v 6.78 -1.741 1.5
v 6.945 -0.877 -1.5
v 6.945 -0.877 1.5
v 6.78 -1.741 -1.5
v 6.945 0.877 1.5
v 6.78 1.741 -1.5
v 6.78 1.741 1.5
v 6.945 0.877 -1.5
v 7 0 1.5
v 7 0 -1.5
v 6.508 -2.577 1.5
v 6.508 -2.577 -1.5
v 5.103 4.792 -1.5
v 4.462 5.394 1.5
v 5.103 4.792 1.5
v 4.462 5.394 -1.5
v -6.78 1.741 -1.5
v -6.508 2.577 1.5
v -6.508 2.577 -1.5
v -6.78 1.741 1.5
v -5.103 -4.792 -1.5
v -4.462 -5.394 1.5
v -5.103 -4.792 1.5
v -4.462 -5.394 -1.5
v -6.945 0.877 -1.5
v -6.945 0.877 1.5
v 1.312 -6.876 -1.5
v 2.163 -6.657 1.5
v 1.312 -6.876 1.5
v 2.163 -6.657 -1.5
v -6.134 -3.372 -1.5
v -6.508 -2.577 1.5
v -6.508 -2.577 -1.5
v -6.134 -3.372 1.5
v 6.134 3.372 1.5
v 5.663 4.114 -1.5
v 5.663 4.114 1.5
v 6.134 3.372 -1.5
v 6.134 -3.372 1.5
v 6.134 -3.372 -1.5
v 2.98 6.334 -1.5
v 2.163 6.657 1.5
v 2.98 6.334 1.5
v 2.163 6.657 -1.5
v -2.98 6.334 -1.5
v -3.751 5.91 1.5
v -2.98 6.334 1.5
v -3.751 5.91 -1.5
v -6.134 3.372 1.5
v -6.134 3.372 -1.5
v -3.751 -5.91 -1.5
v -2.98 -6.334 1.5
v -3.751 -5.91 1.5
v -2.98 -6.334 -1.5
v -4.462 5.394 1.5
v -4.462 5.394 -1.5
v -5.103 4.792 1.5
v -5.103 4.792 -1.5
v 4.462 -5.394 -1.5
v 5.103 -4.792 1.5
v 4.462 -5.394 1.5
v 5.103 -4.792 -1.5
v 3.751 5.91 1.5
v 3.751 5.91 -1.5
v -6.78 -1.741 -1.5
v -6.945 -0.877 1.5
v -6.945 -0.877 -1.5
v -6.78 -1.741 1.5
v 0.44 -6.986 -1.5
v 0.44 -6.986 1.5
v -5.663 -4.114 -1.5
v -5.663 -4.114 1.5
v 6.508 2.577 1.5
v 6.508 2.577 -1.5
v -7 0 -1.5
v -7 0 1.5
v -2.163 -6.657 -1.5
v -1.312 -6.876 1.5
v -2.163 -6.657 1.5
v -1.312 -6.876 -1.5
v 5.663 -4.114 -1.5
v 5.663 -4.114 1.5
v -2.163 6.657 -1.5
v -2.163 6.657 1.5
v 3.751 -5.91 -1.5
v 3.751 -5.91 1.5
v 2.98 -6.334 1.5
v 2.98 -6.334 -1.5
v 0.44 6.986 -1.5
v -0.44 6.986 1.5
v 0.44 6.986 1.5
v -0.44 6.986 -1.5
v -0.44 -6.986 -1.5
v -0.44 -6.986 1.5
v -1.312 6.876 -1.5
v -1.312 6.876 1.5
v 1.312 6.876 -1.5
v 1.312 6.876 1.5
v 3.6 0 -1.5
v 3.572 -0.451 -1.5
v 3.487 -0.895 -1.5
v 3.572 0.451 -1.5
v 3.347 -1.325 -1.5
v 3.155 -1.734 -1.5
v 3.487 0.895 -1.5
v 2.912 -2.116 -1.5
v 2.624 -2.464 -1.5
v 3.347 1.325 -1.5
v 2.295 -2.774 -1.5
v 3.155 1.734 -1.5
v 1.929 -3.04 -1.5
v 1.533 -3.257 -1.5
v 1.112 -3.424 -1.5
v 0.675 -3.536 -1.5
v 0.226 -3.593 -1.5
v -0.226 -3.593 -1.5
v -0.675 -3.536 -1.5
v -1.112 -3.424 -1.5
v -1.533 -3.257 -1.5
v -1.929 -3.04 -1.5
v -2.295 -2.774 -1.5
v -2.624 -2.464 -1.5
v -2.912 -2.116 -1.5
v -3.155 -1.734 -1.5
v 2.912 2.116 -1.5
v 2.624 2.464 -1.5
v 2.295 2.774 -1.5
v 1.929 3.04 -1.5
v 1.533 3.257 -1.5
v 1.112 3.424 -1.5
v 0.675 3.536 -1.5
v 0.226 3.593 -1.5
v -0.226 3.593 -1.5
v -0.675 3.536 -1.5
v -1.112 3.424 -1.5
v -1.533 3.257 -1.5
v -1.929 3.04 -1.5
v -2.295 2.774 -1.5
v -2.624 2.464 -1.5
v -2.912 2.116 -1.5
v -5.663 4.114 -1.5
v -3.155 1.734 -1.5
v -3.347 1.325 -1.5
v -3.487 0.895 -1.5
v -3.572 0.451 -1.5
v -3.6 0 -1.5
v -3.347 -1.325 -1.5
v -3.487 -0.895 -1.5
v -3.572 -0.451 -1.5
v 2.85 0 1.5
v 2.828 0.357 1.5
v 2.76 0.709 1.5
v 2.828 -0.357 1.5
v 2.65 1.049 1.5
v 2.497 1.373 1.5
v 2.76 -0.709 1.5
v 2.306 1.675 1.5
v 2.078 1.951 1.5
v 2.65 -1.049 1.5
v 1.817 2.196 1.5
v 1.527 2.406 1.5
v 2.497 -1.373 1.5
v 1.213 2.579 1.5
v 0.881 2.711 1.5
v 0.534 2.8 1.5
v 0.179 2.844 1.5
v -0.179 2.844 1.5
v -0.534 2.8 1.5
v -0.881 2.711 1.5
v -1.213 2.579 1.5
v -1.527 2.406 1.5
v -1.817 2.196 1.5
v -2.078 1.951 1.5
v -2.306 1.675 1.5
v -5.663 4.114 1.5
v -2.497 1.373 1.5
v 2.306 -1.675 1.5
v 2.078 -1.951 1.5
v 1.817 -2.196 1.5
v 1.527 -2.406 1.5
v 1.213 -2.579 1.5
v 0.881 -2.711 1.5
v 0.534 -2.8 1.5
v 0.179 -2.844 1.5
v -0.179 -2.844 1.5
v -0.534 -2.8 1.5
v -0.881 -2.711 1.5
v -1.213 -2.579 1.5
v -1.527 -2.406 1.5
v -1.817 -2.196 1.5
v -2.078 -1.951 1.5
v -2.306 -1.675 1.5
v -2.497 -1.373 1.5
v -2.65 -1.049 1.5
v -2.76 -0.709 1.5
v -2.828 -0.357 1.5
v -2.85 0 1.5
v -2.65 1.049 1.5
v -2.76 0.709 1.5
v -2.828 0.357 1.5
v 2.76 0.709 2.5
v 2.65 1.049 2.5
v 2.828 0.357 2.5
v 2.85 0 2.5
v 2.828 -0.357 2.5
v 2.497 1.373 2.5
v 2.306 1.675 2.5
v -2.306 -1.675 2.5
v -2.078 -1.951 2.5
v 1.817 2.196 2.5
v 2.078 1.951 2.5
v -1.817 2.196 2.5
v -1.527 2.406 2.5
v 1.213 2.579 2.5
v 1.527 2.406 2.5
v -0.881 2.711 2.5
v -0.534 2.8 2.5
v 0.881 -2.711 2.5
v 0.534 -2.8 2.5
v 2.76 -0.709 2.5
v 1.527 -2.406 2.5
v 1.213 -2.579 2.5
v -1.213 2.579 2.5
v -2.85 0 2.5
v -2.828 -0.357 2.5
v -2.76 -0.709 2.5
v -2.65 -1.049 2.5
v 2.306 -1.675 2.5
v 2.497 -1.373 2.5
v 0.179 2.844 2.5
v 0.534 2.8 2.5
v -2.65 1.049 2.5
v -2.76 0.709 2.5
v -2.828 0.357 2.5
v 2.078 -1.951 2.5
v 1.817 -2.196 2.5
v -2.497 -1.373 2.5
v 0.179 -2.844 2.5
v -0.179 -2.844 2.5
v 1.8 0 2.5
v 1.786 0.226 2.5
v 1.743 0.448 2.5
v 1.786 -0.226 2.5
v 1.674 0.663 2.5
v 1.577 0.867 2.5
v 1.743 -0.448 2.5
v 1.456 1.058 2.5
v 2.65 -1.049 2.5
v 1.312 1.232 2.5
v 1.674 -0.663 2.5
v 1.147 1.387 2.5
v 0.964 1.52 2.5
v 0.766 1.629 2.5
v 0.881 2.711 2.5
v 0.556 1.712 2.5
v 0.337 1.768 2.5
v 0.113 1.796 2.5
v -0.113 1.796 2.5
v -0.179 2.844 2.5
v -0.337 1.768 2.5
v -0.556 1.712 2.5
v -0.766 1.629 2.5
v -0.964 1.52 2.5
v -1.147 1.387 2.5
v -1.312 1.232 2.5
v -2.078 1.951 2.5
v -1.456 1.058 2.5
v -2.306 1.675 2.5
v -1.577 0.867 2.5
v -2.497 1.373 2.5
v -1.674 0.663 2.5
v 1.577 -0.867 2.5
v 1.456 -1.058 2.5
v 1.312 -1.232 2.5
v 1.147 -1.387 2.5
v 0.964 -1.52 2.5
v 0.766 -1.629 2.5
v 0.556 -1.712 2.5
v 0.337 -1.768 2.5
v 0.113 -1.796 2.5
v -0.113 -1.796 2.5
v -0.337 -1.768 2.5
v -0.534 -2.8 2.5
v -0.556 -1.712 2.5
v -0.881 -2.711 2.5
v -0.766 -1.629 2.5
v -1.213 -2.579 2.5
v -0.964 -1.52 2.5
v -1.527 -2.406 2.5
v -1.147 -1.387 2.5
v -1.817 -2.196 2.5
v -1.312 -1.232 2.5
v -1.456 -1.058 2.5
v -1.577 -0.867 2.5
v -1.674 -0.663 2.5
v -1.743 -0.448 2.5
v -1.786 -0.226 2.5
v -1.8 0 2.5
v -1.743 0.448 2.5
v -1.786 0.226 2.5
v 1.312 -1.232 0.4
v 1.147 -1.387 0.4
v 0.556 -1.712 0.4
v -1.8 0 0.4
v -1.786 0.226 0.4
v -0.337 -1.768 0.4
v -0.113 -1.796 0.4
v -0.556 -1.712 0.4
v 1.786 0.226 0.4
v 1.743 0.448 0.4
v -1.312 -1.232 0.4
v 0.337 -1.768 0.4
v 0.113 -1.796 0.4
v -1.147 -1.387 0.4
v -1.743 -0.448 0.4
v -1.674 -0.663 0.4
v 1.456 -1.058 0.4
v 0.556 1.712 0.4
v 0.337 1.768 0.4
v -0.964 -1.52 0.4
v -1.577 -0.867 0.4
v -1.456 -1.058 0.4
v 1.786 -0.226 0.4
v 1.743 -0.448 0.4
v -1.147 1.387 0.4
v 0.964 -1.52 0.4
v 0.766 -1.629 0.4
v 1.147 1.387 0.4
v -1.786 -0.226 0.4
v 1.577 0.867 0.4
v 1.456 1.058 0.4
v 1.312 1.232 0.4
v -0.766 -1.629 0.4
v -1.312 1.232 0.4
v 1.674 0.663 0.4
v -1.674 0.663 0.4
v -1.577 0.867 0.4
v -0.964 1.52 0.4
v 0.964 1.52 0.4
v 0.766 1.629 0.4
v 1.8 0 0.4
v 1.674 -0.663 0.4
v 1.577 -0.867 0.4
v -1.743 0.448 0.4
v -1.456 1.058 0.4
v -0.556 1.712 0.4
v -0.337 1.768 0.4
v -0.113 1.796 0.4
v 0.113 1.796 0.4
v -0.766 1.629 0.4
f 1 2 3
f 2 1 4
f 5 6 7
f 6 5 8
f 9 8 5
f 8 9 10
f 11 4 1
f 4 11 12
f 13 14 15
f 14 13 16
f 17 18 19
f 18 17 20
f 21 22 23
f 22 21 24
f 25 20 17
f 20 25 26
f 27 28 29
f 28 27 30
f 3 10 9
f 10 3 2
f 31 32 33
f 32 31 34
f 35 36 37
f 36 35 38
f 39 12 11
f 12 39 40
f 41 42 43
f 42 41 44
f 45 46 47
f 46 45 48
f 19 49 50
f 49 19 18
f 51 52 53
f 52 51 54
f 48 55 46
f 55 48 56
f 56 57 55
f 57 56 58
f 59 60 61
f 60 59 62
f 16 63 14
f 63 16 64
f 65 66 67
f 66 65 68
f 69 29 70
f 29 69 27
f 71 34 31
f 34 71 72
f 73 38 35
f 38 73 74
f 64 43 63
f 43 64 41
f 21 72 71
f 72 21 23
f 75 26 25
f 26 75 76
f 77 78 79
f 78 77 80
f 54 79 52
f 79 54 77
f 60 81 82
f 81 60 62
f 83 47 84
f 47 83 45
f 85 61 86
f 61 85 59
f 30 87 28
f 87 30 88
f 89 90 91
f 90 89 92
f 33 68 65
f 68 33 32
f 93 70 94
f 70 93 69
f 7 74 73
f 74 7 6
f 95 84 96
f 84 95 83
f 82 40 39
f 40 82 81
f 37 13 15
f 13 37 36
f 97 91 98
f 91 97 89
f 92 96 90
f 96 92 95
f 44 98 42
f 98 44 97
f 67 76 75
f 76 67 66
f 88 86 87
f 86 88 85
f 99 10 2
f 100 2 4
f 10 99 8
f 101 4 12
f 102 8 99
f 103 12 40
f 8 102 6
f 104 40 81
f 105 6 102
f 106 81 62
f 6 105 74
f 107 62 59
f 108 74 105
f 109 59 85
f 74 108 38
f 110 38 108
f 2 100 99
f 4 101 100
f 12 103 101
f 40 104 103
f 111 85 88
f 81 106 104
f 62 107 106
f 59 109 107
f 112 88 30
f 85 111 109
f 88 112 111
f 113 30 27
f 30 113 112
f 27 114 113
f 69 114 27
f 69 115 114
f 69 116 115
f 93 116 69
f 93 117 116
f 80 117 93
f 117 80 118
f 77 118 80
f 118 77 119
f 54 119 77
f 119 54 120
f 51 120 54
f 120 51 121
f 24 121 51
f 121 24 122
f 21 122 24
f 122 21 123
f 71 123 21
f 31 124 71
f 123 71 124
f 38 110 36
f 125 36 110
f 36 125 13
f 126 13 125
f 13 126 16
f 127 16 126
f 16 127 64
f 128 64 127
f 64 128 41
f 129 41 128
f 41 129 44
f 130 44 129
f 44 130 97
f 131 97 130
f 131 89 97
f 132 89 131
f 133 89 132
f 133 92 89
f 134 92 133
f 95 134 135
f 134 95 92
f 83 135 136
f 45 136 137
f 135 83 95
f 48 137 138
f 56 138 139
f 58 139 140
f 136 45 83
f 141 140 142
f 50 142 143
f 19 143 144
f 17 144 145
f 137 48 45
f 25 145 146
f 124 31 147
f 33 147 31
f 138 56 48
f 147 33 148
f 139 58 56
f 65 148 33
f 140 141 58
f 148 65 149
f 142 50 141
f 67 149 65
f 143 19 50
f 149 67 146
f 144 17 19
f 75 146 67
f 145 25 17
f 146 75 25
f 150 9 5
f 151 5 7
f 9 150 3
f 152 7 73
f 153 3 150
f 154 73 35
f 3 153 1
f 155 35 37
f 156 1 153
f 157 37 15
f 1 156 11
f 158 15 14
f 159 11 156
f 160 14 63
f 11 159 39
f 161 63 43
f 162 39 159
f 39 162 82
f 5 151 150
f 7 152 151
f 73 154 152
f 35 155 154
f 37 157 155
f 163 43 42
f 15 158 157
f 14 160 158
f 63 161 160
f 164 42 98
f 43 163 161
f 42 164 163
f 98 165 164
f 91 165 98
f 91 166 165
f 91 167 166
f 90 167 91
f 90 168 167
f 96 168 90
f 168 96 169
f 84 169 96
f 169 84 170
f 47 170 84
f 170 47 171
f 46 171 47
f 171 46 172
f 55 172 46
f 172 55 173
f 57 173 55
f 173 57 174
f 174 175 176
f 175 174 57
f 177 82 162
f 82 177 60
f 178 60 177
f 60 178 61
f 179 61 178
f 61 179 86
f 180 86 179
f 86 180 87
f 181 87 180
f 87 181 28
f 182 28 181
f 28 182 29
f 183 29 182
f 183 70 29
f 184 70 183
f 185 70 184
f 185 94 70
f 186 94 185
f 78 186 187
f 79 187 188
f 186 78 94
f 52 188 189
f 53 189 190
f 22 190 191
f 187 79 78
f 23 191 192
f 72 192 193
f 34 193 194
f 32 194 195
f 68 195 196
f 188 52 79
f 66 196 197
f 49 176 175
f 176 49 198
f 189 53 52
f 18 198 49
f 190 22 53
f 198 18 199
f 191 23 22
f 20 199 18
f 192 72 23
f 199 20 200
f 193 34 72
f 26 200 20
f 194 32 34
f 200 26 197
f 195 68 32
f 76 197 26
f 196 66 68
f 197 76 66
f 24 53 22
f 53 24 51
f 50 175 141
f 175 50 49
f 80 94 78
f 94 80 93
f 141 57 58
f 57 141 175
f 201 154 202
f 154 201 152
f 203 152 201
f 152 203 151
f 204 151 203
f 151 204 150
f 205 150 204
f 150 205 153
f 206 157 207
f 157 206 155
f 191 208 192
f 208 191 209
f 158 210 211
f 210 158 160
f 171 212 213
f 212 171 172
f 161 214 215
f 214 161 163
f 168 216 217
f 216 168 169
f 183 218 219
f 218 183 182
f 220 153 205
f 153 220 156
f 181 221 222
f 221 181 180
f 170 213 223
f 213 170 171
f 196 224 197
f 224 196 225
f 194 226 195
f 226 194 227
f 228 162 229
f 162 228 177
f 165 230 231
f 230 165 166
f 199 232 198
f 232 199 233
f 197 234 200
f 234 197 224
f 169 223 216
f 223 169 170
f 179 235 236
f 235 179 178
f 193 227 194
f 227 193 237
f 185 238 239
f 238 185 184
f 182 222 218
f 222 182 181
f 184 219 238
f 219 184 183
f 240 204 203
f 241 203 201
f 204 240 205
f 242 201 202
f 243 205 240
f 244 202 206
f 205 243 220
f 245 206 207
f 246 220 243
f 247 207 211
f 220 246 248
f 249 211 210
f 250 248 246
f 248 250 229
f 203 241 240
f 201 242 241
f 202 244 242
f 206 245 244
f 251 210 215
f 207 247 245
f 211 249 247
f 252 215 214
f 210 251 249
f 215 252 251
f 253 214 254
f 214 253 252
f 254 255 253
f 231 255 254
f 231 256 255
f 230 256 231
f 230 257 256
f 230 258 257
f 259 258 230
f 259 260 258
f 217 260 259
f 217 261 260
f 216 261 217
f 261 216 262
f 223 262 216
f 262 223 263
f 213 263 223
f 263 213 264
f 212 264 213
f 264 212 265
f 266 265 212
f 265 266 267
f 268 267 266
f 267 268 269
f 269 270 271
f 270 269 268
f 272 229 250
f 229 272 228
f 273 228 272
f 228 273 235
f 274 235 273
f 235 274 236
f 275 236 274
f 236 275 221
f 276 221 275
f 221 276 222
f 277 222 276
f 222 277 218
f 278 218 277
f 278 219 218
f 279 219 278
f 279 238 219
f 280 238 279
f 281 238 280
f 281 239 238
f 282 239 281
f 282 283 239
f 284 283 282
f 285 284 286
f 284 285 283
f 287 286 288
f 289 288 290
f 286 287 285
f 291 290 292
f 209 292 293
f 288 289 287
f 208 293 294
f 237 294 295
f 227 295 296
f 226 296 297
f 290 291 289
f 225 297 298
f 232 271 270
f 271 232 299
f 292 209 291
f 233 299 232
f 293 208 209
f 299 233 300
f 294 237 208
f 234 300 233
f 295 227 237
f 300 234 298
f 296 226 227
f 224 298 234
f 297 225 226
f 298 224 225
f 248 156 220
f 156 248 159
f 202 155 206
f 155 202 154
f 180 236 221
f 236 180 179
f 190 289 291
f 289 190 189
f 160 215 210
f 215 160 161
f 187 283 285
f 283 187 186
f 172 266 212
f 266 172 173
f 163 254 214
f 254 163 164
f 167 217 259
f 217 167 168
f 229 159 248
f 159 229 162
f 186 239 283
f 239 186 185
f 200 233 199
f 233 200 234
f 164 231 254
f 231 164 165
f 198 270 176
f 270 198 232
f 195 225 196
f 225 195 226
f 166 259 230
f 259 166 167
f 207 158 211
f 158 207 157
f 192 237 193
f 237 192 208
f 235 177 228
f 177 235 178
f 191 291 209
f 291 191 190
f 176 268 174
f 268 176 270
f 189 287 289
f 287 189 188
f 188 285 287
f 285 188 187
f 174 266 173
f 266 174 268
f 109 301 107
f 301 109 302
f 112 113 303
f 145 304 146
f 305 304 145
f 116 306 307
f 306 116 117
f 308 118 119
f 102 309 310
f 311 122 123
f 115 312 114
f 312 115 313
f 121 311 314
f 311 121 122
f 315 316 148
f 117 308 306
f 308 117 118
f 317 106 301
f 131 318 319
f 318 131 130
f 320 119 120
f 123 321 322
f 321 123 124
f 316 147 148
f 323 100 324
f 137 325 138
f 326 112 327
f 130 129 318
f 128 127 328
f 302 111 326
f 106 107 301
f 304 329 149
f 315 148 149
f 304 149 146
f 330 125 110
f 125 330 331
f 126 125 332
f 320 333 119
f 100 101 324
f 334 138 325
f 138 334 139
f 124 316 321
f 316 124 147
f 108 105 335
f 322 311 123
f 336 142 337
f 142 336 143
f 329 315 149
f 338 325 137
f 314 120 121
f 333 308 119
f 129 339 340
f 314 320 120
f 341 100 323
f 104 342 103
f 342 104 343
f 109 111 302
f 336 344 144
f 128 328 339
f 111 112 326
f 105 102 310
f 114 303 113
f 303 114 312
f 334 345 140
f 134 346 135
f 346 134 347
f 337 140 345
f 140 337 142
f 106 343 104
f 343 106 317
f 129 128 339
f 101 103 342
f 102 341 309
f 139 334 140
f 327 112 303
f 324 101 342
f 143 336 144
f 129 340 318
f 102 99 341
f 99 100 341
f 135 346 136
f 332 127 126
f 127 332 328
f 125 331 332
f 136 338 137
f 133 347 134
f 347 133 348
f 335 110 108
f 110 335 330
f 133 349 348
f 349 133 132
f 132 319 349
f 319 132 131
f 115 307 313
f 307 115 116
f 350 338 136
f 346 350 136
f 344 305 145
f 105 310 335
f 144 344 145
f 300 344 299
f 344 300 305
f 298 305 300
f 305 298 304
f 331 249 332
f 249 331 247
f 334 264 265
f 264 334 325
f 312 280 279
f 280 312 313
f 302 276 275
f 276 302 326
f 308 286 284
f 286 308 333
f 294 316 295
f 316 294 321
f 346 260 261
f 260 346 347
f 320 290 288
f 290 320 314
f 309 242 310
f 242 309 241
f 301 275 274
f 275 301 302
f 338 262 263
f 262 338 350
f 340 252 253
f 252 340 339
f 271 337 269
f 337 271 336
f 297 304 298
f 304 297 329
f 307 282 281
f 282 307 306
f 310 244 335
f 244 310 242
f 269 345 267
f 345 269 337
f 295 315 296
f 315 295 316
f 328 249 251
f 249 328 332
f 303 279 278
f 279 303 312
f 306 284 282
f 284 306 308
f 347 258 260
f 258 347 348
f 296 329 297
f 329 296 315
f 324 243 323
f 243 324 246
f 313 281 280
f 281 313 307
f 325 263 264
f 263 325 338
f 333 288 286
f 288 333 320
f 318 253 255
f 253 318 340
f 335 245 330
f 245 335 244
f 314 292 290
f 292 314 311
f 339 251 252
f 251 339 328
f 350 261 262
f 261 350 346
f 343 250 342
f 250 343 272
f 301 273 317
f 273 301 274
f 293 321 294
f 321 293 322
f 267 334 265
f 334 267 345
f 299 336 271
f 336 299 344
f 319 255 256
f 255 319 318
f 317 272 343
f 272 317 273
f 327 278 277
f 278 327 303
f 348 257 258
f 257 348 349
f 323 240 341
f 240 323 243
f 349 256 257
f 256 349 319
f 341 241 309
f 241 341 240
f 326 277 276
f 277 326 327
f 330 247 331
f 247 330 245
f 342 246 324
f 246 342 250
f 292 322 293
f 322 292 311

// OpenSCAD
$fn = 50;


difference() {
	union() {
		translate(v = [0, 0, -1.5000000000]) {
			cylinder(h = 3, r = 7.0000000000);
		}
		translate(v = [0, 0, -1.5000000000]) {
			cylinder(h = 4, r = 2.8500000000);
		}
	}
	union() {
		translate(v = [0, 0, -1.5000000000]) {
			rotate(a = [0, 180, 0]) {
				difference() {
					union() {
						translate(v = [0, 0, -4.0000000000]) {
							cylinder(h = 4, r = 1.5000000000);
						}
						translate(v = [0, 0, -1.9000000000]) {
							cylinder(h = 1.9000000000, r1 = 1.8000000000, r2 = 3.6000000000);
						}
						translate(v = [0, 0, -4.0000000000]) {
							cylinder(h = 4, r = 1.8000000000);
						}
						translate(v = [0, 0, -4.0000000000]) {
							cylinder(h = 4, r = 1.5000000000);
						}
					}
					union();
				}
			}
		}
		translate(v = [0, 0, -100.0000000000]) {
			cylinder(h = 200, r = 1.8000000000);
		}
	}
}
